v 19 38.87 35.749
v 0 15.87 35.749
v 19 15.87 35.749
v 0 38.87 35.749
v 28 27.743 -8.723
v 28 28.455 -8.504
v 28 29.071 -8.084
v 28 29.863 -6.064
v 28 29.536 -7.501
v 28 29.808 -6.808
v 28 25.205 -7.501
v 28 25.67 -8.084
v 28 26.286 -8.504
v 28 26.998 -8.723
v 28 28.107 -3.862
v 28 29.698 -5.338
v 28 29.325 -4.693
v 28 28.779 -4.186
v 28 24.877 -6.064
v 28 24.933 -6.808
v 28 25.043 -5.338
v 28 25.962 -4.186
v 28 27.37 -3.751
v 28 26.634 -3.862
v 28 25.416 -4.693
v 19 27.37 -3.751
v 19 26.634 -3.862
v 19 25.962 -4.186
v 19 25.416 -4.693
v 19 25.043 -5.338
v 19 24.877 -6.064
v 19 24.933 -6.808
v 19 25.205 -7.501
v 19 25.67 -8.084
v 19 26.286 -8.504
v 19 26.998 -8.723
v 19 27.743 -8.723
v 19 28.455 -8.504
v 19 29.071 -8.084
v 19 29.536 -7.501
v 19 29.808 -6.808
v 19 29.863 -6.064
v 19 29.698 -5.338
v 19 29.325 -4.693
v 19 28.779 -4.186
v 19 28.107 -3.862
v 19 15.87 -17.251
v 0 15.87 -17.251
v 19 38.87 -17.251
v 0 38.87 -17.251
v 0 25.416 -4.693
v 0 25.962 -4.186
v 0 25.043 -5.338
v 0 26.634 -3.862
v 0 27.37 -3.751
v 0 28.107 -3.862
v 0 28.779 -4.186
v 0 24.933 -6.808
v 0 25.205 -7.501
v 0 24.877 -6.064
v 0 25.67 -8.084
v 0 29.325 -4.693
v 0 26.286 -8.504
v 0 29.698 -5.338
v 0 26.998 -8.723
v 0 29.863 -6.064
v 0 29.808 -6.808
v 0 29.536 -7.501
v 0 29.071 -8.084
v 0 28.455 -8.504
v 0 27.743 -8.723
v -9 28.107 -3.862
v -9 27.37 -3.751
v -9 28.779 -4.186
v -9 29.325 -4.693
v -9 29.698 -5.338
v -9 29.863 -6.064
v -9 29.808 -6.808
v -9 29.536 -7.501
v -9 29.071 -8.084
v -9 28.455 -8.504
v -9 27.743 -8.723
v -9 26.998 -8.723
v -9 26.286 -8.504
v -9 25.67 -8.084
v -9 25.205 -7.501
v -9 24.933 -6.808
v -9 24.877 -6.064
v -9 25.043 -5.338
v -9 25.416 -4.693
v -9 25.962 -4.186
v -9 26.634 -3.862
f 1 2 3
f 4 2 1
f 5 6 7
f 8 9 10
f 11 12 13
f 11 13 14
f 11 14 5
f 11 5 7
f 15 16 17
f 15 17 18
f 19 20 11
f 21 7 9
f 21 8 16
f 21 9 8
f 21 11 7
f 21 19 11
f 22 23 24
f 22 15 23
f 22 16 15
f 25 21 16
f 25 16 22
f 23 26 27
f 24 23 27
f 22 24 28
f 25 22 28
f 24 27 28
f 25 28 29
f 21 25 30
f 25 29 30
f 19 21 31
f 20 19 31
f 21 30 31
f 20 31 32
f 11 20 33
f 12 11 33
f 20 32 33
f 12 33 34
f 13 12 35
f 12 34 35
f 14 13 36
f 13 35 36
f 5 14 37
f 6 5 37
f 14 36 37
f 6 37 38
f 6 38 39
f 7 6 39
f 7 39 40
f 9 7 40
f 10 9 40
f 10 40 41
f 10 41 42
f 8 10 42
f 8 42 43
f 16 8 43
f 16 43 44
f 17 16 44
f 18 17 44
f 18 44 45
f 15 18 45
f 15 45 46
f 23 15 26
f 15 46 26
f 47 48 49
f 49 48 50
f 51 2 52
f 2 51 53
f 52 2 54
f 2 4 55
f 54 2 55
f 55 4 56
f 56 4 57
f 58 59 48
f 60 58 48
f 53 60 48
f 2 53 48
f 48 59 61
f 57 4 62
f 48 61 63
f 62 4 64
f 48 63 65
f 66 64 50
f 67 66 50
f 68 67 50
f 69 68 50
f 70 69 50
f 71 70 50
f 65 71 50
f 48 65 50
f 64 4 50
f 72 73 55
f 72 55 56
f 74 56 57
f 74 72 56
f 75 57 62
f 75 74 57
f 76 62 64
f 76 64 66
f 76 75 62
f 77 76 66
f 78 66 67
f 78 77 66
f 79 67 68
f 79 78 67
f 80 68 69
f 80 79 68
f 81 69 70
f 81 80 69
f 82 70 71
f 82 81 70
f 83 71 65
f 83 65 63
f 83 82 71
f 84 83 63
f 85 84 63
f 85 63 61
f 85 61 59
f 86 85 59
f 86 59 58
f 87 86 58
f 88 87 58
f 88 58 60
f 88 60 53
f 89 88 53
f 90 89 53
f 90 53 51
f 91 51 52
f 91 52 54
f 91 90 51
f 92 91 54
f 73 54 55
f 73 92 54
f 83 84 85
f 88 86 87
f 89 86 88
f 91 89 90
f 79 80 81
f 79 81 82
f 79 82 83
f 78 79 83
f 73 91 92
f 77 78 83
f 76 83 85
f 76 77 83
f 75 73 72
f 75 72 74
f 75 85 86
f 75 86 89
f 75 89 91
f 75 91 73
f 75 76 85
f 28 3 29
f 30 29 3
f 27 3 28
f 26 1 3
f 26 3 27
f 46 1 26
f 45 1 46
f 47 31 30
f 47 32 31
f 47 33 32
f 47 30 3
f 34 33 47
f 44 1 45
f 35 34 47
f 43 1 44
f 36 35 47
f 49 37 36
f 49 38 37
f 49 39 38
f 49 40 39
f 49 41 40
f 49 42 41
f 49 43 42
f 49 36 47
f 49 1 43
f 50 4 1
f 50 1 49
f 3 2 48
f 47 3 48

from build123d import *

# Parameters (mm, degrees)
SKETCH_2_W      = 53
SKETCH_2_H      = 23
EXTRUDE_1_DEPTH = 19
SKETCH_3_R      = 2.5
EXTRUDE_2_DEPTH = 9
EXTRUDE_START   = 9
SKETCH_7_R      = 2.5
EXTRUDE_5_DEPTH = 9


with BuildPart() as part:
    # 草图2 → 凸台-拉伸1 (new body)
    with BuildSketch(Plane(origin=(0, 0, 0), x_dir=(0, 0, -1), z_dir=(1, 0, 0))):
        with Locations((-9.248715633, 27.370444178)):
            Rectangle(SKETCH_2_W, SKETCH_2_H)
    extrude(amount=EXTRUDE_1_DEPTH)

    # 草图3 → 凸台-拉伸2 (add)
    with BuildSketch(Plane(origin=(19, 0, 0), x_dir=(0, 0, -1), z_dir=(1, 0, 0))):
        with Locations(Location((6.251284367, 27.370444178, 0), (0, 0, 180))):
            Circle(SKETCH_3_R)
    extrude(amount=EXTRUDE_2_DEPTH)

    # 草图7 → 凸台-拉伸5 (add)
    with BuildSketch(Plane.ZY.offset(EXTRUDE_START)):
        with Locations((-6.251284367, 27.370444178)):
            Circle(SKETCH_7_R)
    extrude(amount=-EXTRUDE_5_DEPTH)


solid = part.part
